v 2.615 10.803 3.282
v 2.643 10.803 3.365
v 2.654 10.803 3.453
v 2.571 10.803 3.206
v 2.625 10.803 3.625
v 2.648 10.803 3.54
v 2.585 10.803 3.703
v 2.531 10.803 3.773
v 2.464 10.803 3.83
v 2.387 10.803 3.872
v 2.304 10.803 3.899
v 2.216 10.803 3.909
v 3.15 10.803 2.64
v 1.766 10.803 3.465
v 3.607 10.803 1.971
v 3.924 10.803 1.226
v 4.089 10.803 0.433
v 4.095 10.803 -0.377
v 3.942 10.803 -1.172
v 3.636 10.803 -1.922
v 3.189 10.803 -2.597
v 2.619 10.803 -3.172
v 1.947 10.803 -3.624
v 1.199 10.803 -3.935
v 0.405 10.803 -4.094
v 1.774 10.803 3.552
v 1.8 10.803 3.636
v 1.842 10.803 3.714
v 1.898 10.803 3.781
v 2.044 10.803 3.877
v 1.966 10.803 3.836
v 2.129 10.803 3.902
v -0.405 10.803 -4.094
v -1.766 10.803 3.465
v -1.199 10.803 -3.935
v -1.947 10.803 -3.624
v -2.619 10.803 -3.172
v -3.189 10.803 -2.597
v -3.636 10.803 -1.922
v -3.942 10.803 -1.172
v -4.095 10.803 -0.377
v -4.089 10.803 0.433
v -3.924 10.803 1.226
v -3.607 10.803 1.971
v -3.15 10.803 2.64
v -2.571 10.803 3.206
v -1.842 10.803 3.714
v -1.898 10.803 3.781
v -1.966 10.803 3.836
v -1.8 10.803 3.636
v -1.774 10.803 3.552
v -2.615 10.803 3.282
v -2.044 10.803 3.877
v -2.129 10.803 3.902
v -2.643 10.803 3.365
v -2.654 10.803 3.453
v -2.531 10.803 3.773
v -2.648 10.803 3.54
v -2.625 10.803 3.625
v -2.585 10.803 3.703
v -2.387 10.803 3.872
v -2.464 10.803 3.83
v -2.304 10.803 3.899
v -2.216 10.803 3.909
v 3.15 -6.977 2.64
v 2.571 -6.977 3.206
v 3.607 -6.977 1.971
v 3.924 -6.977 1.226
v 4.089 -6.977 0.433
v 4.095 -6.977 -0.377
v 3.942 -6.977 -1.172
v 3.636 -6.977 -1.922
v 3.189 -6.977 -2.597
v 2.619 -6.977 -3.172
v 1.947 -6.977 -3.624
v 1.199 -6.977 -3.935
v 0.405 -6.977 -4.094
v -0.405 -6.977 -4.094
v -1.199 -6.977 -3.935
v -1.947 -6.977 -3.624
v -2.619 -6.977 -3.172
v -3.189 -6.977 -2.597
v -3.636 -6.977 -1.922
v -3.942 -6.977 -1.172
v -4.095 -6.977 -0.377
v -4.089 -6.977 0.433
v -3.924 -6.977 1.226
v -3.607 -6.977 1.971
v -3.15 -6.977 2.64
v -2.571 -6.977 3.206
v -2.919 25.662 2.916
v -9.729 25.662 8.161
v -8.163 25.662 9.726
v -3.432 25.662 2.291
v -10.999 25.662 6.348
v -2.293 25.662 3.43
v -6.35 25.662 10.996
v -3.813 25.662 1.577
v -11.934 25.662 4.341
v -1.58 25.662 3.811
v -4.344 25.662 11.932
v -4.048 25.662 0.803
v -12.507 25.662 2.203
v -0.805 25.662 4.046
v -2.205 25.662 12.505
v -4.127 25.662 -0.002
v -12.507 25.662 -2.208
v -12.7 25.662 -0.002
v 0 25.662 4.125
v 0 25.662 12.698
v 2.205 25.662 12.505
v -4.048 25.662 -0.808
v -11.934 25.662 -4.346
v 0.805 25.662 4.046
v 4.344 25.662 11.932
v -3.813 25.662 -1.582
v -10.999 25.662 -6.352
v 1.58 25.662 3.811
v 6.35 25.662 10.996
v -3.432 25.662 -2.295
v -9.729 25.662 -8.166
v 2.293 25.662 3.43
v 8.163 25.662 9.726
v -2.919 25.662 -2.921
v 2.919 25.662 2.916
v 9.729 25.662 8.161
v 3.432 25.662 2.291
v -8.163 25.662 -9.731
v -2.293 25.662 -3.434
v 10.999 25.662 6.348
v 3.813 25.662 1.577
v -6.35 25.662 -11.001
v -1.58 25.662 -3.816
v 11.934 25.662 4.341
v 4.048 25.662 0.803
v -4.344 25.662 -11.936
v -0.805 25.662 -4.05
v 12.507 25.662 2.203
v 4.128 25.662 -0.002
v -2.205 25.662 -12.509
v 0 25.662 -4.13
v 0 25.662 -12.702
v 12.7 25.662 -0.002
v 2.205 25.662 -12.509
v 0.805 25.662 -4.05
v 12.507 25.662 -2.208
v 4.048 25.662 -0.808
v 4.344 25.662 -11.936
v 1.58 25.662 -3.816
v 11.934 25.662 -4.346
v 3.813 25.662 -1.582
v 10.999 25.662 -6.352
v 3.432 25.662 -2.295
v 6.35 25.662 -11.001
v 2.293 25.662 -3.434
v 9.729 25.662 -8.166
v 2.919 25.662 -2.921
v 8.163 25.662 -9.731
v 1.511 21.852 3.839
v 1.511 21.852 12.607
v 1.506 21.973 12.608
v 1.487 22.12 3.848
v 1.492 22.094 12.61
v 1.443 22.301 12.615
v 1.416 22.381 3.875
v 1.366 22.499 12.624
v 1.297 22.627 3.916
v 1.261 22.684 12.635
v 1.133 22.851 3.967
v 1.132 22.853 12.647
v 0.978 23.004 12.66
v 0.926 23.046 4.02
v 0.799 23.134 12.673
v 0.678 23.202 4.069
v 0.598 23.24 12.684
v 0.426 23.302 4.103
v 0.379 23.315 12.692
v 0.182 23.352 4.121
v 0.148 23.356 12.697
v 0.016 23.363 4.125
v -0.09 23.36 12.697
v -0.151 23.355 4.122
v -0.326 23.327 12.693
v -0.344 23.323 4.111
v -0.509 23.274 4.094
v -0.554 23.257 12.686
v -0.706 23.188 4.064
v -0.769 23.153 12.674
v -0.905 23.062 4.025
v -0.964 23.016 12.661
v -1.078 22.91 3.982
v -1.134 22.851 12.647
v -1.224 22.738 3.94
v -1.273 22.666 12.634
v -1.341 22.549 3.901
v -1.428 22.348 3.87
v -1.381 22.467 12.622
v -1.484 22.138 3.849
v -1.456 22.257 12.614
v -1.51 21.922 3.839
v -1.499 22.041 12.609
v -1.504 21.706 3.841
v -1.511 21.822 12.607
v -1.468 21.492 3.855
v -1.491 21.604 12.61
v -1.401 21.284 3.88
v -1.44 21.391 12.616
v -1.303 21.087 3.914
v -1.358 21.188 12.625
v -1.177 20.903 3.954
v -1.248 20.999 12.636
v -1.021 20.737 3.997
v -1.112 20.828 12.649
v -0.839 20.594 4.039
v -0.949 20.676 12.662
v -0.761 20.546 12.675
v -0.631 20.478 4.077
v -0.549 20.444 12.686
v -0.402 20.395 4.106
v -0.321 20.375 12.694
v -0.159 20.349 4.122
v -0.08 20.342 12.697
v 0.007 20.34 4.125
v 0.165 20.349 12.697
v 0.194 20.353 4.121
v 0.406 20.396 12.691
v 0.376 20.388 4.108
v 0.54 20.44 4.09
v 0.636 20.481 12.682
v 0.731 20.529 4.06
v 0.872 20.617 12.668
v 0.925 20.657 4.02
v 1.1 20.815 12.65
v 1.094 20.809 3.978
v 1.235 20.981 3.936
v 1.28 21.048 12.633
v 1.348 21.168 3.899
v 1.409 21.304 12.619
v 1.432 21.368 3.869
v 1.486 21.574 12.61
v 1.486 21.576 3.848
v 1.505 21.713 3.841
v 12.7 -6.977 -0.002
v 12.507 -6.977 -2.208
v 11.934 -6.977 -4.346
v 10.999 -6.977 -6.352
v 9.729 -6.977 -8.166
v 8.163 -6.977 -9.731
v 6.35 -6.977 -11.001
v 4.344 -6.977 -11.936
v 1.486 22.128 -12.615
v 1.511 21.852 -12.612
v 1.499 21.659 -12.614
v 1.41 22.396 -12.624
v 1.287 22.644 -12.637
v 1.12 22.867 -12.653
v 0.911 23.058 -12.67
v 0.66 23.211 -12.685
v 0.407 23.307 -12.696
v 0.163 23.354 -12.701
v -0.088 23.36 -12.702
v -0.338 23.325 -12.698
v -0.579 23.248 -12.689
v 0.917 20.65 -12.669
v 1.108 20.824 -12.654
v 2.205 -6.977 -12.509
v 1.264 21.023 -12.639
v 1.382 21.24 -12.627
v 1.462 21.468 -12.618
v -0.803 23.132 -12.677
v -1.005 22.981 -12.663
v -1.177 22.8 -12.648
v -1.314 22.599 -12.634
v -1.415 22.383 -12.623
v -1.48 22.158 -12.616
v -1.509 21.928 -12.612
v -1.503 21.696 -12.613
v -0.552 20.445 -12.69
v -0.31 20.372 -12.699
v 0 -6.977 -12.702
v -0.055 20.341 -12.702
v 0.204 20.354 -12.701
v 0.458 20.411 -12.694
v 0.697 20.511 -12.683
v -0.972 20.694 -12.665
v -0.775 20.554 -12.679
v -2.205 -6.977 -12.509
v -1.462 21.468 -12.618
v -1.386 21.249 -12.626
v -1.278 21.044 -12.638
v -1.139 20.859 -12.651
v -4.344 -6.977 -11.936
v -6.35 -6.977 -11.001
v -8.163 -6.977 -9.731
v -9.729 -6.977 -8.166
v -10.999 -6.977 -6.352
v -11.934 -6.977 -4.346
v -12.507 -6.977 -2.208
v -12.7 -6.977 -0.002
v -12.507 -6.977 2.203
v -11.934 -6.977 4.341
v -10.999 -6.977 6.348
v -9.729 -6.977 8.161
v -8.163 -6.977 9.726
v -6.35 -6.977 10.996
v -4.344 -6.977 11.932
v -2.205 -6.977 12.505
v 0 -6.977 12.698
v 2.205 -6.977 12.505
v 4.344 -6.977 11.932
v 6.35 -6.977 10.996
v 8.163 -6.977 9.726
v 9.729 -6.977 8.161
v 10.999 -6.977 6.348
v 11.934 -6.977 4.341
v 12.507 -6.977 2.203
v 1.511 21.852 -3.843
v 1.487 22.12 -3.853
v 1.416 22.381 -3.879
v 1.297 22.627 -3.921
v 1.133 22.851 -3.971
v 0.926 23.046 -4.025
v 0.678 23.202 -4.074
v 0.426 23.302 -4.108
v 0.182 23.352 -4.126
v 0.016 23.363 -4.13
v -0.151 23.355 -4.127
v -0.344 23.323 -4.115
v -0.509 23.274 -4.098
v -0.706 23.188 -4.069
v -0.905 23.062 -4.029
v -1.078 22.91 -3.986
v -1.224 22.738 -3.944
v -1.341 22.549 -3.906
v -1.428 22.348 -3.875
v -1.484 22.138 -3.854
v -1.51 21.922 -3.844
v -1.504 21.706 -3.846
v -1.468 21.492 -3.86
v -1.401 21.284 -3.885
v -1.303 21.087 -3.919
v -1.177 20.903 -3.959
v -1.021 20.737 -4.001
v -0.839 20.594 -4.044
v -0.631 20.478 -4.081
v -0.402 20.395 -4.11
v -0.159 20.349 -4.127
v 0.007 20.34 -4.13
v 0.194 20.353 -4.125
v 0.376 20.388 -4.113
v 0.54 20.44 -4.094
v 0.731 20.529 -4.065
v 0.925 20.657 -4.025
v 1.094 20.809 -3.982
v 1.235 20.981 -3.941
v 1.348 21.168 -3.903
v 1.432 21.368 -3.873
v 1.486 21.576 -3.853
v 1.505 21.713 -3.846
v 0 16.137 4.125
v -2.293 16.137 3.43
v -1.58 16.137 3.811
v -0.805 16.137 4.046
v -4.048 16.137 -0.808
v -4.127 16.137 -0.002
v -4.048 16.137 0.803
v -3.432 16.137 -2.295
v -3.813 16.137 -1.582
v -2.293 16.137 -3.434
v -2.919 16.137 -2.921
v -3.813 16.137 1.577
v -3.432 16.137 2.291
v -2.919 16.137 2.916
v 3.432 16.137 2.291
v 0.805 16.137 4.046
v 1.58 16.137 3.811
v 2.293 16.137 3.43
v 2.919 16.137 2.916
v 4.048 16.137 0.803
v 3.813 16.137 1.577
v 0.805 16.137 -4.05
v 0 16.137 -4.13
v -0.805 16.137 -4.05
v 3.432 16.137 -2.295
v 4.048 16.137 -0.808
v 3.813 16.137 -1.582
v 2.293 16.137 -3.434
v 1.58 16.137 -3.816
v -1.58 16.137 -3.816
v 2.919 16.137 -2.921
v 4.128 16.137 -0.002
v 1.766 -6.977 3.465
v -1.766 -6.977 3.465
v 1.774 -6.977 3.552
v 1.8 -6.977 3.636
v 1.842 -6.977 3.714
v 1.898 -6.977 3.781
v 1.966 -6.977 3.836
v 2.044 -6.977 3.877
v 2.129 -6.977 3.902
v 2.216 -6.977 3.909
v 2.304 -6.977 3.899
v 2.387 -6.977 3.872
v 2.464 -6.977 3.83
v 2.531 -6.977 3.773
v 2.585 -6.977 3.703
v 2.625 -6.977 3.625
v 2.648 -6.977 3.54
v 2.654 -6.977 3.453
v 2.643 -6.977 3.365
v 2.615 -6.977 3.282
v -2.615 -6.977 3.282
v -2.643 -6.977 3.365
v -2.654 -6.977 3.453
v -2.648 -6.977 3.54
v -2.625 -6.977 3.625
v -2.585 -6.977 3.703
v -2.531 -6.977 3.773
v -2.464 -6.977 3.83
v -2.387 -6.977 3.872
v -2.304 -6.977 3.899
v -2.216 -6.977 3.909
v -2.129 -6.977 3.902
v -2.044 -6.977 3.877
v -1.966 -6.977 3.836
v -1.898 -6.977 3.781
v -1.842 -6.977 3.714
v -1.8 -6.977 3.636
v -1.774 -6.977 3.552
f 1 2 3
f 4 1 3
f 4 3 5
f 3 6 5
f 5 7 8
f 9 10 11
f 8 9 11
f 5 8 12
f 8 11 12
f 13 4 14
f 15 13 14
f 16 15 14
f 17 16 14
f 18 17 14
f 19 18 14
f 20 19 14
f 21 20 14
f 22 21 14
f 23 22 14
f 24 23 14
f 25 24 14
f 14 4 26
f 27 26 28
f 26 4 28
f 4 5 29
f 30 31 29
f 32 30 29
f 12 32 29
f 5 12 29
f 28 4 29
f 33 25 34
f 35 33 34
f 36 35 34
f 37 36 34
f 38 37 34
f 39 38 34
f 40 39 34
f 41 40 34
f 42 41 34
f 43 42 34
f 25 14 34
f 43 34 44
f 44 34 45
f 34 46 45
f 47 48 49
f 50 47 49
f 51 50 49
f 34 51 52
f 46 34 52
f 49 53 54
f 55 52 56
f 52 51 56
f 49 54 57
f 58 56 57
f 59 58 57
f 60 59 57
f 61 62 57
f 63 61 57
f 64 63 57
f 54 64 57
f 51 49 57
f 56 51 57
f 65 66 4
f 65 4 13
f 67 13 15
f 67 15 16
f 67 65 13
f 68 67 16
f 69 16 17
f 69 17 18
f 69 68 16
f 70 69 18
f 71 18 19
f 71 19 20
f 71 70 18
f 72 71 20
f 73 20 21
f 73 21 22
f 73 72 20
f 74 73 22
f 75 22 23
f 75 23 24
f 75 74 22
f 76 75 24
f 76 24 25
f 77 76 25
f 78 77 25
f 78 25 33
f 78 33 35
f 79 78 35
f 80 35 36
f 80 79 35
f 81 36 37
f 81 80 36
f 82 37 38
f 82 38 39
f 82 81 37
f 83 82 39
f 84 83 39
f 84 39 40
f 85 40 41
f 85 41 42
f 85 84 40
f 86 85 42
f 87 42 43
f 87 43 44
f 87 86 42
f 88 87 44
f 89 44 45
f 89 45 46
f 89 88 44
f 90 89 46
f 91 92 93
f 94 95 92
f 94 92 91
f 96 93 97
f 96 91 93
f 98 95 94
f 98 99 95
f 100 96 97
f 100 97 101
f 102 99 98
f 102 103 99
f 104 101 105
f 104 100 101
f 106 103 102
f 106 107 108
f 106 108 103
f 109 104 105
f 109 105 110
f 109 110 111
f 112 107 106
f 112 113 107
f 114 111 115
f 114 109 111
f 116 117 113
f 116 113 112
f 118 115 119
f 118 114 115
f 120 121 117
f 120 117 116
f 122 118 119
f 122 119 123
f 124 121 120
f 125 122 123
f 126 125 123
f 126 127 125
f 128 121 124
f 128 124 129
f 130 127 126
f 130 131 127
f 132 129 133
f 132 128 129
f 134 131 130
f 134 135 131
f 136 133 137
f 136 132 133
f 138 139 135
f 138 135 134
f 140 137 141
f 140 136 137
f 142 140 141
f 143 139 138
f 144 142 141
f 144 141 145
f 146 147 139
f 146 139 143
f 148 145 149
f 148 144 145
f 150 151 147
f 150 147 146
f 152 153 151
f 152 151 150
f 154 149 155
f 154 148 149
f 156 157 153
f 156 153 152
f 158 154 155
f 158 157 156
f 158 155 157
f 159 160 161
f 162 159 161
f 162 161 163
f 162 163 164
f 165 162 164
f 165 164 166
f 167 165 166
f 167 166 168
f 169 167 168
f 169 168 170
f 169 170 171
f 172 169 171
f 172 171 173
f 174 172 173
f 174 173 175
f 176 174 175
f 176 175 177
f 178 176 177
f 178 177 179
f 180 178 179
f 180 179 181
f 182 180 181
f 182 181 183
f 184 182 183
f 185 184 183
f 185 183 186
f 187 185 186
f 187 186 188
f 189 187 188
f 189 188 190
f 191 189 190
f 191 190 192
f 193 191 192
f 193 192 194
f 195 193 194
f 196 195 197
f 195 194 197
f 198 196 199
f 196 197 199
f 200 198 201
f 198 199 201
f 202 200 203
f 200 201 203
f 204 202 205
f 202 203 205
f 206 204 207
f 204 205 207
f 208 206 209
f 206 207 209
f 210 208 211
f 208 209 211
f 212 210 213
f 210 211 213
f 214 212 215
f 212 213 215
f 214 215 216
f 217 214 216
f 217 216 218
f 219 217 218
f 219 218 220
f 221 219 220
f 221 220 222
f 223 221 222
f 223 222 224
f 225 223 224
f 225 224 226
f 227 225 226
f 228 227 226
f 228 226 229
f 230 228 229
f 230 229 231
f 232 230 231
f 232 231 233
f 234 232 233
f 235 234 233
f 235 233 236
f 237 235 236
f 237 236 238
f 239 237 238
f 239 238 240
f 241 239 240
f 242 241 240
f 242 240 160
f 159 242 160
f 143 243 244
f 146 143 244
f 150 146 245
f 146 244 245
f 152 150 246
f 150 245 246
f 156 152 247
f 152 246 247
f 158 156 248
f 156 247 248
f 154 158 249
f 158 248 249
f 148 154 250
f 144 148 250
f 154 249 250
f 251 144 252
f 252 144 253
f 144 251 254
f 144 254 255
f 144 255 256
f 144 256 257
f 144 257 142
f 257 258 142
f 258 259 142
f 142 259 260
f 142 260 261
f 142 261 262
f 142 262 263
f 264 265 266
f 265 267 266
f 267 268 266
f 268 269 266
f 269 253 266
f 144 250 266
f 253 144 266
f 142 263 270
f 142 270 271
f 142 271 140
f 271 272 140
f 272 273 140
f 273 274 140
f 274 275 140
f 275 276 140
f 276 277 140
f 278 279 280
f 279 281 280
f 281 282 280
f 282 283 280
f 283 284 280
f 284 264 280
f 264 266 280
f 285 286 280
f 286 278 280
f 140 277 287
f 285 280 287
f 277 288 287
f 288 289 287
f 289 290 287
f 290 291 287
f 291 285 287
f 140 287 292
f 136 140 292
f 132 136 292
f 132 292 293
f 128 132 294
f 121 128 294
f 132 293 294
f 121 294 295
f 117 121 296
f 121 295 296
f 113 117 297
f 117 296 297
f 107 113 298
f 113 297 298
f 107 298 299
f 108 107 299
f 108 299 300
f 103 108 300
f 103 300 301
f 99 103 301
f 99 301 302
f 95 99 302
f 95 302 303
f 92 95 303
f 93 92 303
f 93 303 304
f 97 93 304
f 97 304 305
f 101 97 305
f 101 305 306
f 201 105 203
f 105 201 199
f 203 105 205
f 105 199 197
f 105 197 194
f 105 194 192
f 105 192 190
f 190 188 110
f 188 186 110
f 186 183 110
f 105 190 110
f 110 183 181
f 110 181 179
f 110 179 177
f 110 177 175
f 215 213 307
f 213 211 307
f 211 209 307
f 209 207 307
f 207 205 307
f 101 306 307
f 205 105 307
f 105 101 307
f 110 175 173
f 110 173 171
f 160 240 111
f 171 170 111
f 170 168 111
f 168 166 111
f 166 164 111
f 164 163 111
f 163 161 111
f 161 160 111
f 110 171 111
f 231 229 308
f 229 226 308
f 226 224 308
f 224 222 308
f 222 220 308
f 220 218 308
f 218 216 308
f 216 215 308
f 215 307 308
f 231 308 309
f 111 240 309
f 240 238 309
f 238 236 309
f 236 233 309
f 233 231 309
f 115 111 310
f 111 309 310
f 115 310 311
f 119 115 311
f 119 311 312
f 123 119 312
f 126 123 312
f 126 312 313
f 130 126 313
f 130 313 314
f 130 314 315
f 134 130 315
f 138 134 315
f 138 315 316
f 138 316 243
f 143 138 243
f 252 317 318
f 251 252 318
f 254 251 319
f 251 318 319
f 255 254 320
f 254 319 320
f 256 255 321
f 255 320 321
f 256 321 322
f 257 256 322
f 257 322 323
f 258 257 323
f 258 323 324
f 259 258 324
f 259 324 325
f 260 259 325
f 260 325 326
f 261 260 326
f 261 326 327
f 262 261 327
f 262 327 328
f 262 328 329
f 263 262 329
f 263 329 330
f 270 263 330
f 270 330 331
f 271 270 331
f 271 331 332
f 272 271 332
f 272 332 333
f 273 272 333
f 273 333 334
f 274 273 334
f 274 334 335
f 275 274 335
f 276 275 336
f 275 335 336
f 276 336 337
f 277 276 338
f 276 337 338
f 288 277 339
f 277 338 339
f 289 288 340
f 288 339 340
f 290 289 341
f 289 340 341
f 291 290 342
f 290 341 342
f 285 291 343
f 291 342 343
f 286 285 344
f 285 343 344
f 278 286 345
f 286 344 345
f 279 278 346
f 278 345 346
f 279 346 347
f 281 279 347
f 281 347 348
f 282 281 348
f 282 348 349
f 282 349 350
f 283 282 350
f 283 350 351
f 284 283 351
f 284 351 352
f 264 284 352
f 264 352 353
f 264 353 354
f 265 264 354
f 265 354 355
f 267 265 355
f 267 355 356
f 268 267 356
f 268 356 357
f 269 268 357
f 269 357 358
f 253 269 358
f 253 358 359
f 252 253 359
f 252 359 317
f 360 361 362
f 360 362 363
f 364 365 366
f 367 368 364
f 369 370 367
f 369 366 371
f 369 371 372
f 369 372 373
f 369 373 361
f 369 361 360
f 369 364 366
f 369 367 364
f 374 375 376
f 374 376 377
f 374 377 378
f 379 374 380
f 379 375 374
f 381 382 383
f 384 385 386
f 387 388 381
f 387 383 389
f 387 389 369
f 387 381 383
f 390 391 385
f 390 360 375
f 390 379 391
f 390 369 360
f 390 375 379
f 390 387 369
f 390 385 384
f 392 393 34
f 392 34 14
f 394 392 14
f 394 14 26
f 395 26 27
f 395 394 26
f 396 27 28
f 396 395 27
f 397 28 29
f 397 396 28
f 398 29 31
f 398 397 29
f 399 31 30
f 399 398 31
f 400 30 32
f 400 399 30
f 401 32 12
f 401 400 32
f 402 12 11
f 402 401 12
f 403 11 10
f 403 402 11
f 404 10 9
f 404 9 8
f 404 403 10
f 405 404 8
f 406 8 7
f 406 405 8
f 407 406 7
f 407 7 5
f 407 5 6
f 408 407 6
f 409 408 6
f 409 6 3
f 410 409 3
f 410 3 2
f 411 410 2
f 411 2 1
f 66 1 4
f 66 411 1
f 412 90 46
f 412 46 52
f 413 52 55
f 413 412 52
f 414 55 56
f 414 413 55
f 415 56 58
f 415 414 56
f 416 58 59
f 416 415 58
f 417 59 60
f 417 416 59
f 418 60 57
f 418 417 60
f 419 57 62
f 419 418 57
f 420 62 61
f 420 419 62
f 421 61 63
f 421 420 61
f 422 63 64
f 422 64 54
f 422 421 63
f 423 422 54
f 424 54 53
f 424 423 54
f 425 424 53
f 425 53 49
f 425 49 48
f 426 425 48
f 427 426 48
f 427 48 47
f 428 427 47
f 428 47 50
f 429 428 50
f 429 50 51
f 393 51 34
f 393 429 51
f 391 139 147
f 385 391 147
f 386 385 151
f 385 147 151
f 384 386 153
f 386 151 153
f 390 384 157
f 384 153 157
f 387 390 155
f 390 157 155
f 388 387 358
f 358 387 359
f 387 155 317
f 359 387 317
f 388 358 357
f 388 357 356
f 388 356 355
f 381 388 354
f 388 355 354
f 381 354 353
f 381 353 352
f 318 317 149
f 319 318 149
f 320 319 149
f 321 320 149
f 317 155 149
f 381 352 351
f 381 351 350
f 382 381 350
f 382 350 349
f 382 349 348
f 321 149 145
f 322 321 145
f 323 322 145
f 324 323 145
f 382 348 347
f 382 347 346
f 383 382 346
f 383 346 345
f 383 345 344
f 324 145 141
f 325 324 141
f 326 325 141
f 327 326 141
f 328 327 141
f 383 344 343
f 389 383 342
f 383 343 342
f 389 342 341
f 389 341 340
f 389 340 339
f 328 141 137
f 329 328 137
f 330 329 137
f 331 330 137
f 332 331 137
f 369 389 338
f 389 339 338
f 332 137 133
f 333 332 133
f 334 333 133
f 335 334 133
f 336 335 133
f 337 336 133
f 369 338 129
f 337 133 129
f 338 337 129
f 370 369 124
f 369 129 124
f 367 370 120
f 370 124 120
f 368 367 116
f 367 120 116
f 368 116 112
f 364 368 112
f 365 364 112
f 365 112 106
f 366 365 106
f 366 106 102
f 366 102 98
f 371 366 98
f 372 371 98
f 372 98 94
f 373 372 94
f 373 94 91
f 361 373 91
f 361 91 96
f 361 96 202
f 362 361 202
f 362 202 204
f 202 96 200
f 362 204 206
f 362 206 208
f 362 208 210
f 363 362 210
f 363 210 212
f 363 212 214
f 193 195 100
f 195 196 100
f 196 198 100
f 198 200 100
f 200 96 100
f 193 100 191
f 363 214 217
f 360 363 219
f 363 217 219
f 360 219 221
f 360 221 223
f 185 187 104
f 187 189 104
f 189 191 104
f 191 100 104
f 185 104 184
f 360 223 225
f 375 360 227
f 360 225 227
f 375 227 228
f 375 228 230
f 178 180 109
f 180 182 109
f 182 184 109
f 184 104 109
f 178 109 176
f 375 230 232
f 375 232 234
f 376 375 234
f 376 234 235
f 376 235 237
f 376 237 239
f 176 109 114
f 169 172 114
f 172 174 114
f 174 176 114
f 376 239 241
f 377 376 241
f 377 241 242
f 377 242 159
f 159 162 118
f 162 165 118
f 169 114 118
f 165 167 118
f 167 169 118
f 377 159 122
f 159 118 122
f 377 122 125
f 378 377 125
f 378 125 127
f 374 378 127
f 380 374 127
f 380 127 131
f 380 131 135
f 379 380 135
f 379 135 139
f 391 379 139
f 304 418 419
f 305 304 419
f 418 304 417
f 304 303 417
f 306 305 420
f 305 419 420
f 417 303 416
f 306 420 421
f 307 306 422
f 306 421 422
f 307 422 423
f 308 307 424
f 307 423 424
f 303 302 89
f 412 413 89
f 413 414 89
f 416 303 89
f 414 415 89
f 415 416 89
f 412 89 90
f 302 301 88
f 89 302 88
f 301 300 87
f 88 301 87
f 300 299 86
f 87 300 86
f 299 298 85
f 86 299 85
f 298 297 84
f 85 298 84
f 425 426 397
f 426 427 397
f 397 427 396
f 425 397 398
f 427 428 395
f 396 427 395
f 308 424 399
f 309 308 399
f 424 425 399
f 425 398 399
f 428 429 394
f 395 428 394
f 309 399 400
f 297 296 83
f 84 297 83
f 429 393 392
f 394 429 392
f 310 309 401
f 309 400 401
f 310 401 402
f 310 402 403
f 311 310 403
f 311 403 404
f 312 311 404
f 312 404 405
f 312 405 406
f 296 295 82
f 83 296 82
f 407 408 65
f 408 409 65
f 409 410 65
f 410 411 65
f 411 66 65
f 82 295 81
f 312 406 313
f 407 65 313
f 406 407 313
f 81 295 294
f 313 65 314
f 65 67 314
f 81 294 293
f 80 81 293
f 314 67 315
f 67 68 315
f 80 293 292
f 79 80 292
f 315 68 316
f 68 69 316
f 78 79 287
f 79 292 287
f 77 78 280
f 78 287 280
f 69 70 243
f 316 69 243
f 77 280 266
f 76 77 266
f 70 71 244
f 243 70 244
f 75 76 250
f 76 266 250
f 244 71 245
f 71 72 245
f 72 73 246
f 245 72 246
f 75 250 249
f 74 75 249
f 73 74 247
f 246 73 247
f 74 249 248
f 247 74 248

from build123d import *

# Parameters (mm, degrees)
SKETCH1_R           = 7.257142857
BOSS_EXTRUDE1_DEPTH = 18.650857143
SKETCH2_R           = 2.358571483
CUT_EXTRUDE1_DEPTH  = 5.442857143
CUT_EXTRUDE2_DEPTH  = 10.16
SKETCH4_R           = 0.8636
CUT_EXTRUDE3_DEPTH  = 15.514285714
SCALE1_SCALE        = 1.75


with BuildPart() as part:
    # Sketch1 → Boss-Extrude1 (new body)
    with BuildSketch(Plane(origin=(0, 0, 0), x_dir=(1, 0, 0), z_dir=(0, 1, 0))):
        Circle(SKETCH1_R)
    extrude(amount=BOSS_EXTRUDE1_DEPTH)

    # Sketch2 → Cut-Extrude1 (cut)
    with BuildSketch(Plane(origin=(0, 18.650857143, 0), x_dir=(1, 0, 0), z_dir=(0, 1, 0))):
        Circle(SKETCH2_R)
    extrude(amount=-CUT_EXTRUDE1_DEPTH, mode=Mode.SUBTRACT)

    # Sketch3 → Cut-Extrude2 (cut)
    with BuildSketch(Plane.XZ):
        with BuildLine():
            Line((-1.008931831, 1.9812), (1.008931831, 1.9812))
            ThreePointArc((1.008931831, 1.9812), (1.340608786, 2.22303112), (1.469422309, 1.833288937))
            ThreePointArc((1.469422309, 1.833288937), (0, -2.3495), (-1.469422309, 1.833288937))
            ThreePointArc((-1.469422309, 1.833288937), (-1.340608786, 2.22303112), (-1.008931831, 1.9812))
        make_face()
    extrude(amount=-CUT_EXTRUDE2_DEPTH, mode=Mode.SUBTRACT)

    # Sketch4 → Cut-Extrude3 (cut, through all)
    with BuildSketch(Plane.XY.offset(7.257142857)):
        with Locations((0, 16.473714177)):
            Circle(SKETCH4_R)
    extrude(amount=-CUT_EXTRUDE3_DEPTH, mode=Mode.SUBTRACT)


with BuildPart() as part_1:
    # Scale1: scaled about (-4.09e-06, 9.303254996, 0.003077039)
    add(part.part.scale(SCALE1_SCALE).moved(Location((3.067e-06, -6.977441247, -0.002307779))))


solid = part_1.part
